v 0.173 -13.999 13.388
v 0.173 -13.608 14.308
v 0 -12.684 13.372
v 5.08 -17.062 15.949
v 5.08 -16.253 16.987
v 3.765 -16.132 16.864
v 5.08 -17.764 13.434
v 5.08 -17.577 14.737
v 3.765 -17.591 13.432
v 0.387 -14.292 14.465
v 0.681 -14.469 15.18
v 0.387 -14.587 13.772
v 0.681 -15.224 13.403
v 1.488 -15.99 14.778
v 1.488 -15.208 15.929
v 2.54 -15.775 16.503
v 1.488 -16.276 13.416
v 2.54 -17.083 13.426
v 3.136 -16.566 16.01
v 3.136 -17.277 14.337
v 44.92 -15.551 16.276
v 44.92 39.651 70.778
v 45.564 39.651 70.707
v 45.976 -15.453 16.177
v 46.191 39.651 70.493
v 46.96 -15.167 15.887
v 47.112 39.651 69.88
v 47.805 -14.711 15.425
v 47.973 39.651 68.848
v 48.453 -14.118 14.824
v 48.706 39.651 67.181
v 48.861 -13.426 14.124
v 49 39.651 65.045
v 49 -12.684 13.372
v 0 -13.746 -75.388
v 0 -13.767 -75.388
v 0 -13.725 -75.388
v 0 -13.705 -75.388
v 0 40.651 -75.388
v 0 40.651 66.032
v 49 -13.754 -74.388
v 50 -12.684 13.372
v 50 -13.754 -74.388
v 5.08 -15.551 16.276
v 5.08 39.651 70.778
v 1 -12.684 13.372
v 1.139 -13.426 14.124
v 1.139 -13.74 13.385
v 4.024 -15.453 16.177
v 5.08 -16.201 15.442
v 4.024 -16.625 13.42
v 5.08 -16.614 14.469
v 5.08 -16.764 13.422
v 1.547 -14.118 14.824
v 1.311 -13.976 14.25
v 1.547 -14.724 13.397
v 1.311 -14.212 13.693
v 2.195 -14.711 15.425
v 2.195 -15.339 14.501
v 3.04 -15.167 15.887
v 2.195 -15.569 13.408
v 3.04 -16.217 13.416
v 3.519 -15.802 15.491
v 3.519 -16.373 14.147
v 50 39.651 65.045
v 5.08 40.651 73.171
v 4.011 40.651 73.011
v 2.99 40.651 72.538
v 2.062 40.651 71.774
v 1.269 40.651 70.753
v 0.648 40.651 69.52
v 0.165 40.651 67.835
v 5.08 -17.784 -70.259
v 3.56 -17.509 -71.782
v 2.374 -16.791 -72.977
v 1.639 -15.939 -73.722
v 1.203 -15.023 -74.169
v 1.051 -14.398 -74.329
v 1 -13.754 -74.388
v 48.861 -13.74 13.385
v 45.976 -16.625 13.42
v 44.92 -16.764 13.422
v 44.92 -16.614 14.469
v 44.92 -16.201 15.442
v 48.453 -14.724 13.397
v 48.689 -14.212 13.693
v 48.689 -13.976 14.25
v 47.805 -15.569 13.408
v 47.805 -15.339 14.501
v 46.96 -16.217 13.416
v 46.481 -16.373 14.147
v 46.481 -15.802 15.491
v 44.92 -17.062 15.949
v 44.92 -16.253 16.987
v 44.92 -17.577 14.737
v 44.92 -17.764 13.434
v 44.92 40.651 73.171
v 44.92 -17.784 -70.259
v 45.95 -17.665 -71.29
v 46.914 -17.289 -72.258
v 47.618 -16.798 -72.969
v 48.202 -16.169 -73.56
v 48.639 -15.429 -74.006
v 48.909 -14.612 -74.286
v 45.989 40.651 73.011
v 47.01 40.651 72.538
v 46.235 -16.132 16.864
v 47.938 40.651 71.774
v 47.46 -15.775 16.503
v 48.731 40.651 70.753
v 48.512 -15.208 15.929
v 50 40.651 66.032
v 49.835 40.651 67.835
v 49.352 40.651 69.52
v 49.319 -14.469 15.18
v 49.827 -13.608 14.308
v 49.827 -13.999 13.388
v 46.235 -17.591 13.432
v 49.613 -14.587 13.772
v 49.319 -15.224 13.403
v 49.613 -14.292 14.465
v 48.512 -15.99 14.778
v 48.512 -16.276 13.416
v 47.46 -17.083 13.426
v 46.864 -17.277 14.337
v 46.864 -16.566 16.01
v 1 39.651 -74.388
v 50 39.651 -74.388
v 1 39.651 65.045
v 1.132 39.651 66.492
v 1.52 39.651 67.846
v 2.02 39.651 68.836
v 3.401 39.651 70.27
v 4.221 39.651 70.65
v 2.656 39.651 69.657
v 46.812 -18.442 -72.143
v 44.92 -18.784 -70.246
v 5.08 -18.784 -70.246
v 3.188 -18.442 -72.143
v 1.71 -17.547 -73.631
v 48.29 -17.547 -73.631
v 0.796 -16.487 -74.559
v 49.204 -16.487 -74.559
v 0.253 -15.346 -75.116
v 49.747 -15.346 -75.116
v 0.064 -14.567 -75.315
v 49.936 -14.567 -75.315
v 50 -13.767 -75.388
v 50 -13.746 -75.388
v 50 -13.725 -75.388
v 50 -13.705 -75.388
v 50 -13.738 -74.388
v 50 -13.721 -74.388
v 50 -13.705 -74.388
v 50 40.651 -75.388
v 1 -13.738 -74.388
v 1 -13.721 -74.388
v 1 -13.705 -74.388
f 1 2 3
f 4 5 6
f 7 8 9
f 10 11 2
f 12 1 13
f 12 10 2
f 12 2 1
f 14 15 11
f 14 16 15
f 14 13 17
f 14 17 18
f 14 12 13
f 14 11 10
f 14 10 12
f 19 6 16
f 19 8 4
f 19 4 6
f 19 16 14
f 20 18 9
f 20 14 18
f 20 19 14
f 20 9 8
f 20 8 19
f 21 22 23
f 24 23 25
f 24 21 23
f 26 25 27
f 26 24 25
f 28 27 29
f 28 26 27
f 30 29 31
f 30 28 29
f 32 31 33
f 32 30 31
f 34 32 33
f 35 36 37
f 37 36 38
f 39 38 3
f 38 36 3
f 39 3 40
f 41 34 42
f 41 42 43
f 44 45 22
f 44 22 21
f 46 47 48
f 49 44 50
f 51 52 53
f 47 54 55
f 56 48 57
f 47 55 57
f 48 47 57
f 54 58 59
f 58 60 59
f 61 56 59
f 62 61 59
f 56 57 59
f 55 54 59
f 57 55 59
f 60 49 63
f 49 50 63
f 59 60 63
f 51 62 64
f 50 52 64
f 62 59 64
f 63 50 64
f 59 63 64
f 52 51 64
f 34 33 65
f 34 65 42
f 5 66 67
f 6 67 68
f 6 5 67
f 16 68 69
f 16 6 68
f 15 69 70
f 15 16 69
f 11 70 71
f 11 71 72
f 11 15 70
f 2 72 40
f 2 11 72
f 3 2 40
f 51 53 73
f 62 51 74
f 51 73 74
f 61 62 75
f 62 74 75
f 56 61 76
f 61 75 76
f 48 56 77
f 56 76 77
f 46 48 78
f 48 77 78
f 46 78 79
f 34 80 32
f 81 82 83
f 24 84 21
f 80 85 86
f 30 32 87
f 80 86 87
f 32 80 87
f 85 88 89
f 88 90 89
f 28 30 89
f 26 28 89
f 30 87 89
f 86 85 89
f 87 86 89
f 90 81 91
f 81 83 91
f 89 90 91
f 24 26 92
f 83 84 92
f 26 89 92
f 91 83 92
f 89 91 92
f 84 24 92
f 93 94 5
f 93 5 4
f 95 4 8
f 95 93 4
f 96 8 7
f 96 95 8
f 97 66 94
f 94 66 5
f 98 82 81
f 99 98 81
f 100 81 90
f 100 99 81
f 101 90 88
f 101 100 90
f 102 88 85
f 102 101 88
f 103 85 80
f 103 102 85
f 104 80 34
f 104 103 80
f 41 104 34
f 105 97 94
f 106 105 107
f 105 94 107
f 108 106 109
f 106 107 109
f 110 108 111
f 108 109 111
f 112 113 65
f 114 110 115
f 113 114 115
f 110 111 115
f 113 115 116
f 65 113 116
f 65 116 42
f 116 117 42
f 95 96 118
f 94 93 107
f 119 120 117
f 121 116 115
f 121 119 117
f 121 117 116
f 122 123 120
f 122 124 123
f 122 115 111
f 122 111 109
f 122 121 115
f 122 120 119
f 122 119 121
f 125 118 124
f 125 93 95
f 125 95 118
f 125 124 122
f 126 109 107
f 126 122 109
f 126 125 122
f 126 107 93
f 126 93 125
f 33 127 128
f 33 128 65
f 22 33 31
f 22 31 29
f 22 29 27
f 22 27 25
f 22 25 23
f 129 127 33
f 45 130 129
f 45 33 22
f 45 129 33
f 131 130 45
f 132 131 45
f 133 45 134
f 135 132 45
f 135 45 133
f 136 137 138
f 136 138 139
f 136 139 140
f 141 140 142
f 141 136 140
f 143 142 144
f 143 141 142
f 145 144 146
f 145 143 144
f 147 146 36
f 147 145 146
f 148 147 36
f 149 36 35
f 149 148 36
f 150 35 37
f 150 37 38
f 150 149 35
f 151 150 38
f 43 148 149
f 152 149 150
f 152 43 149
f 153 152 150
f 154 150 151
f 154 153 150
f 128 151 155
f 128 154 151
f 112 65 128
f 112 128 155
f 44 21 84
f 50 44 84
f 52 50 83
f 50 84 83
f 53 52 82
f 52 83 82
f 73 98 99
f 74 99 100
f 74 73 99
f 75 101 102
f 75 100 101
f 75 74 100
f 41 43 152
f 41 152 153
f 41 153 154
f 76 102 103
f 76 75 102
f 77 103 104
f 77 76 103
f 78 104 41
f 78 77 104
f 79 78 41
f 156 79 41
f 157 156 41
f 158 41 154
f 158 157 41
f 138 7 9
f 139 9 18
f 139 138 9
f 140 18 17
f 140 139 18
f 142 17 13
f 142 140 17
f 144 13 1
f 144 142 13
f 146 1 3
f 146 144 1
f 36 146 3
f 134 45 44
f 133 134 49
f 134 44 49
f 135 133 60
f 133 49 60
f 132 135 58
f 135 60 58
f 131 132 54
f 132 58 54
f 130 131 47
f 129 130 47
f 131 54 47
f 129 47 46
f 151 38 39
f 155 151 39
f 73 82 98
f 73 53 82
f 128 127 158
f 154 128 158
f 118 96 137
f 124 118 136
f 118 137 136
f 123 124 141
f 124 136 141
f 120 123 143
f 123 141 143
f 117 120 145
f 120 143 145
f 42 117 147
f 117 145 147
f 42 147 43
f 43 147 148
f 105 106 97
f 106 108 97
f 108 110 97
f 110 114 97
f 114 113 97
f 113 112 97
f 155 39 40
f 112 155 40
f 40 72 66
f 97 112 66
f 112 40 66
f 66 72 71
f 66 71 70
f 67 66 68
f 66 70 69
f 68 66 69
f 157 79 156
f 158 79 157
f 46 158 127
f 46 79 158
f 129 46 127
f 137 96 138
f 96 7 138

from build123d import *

# Parameters (mm, degrees)
F1_DEPTH = 50
F2_R     = 5.08
F3_T     = -1


# Not quite as in the source:
# - a shell that OpenCascade refuses in one call is made with other operations: the cavity is built on its own and cut out


with BuildPart() as f1:
    # F0 (on Right) → F1 (new body)
    with BuildSketch(Plane.YZ):
        Polygon((40.6505316496, -75.3882825375), (40.6505316496, 73.1709599495), (-17.738416791, 15.5211091042), (-18.8470706344, -75.3882825375), align=None)
    extrude(amount=F1_DEPTH)

    # F2
    f2_edges = [f1.edges().sort_by_distance(p)[0] for p in [
        (50, -18.292744, -29.933587),
        (50, 11.456057, 44.346035),
        (25, -17.738417, 15.521109),
        (0, 11.456057, 44.346035),
        (25, -18.847071, -75.388283),
        (0, -18.292744, -29.933587),
    ]]
    fillet(f2_edges, radius=F2_R)

    # F3: a shell. OpenCascade refuses it in one call, so the cavity is built on its own and cut out:
    # the body offset inwards by the wall thickness, plus a prism from it out through each open face.
    f3_core = offset(f1.part, amount=F3_T, mode=Mode.PRIVATE)
    f3_exits = [f3_core.faces().sort_by_distance(p)[0] for p in [
        (49, 15.243523, -16.834061),
    ]]
    add(f3_core, mode=Mode.SUBTRACT)
    extrude(f3_exits, amount=-F3_T, mode=Mode.SUBTRACT)


solid = f1.part
